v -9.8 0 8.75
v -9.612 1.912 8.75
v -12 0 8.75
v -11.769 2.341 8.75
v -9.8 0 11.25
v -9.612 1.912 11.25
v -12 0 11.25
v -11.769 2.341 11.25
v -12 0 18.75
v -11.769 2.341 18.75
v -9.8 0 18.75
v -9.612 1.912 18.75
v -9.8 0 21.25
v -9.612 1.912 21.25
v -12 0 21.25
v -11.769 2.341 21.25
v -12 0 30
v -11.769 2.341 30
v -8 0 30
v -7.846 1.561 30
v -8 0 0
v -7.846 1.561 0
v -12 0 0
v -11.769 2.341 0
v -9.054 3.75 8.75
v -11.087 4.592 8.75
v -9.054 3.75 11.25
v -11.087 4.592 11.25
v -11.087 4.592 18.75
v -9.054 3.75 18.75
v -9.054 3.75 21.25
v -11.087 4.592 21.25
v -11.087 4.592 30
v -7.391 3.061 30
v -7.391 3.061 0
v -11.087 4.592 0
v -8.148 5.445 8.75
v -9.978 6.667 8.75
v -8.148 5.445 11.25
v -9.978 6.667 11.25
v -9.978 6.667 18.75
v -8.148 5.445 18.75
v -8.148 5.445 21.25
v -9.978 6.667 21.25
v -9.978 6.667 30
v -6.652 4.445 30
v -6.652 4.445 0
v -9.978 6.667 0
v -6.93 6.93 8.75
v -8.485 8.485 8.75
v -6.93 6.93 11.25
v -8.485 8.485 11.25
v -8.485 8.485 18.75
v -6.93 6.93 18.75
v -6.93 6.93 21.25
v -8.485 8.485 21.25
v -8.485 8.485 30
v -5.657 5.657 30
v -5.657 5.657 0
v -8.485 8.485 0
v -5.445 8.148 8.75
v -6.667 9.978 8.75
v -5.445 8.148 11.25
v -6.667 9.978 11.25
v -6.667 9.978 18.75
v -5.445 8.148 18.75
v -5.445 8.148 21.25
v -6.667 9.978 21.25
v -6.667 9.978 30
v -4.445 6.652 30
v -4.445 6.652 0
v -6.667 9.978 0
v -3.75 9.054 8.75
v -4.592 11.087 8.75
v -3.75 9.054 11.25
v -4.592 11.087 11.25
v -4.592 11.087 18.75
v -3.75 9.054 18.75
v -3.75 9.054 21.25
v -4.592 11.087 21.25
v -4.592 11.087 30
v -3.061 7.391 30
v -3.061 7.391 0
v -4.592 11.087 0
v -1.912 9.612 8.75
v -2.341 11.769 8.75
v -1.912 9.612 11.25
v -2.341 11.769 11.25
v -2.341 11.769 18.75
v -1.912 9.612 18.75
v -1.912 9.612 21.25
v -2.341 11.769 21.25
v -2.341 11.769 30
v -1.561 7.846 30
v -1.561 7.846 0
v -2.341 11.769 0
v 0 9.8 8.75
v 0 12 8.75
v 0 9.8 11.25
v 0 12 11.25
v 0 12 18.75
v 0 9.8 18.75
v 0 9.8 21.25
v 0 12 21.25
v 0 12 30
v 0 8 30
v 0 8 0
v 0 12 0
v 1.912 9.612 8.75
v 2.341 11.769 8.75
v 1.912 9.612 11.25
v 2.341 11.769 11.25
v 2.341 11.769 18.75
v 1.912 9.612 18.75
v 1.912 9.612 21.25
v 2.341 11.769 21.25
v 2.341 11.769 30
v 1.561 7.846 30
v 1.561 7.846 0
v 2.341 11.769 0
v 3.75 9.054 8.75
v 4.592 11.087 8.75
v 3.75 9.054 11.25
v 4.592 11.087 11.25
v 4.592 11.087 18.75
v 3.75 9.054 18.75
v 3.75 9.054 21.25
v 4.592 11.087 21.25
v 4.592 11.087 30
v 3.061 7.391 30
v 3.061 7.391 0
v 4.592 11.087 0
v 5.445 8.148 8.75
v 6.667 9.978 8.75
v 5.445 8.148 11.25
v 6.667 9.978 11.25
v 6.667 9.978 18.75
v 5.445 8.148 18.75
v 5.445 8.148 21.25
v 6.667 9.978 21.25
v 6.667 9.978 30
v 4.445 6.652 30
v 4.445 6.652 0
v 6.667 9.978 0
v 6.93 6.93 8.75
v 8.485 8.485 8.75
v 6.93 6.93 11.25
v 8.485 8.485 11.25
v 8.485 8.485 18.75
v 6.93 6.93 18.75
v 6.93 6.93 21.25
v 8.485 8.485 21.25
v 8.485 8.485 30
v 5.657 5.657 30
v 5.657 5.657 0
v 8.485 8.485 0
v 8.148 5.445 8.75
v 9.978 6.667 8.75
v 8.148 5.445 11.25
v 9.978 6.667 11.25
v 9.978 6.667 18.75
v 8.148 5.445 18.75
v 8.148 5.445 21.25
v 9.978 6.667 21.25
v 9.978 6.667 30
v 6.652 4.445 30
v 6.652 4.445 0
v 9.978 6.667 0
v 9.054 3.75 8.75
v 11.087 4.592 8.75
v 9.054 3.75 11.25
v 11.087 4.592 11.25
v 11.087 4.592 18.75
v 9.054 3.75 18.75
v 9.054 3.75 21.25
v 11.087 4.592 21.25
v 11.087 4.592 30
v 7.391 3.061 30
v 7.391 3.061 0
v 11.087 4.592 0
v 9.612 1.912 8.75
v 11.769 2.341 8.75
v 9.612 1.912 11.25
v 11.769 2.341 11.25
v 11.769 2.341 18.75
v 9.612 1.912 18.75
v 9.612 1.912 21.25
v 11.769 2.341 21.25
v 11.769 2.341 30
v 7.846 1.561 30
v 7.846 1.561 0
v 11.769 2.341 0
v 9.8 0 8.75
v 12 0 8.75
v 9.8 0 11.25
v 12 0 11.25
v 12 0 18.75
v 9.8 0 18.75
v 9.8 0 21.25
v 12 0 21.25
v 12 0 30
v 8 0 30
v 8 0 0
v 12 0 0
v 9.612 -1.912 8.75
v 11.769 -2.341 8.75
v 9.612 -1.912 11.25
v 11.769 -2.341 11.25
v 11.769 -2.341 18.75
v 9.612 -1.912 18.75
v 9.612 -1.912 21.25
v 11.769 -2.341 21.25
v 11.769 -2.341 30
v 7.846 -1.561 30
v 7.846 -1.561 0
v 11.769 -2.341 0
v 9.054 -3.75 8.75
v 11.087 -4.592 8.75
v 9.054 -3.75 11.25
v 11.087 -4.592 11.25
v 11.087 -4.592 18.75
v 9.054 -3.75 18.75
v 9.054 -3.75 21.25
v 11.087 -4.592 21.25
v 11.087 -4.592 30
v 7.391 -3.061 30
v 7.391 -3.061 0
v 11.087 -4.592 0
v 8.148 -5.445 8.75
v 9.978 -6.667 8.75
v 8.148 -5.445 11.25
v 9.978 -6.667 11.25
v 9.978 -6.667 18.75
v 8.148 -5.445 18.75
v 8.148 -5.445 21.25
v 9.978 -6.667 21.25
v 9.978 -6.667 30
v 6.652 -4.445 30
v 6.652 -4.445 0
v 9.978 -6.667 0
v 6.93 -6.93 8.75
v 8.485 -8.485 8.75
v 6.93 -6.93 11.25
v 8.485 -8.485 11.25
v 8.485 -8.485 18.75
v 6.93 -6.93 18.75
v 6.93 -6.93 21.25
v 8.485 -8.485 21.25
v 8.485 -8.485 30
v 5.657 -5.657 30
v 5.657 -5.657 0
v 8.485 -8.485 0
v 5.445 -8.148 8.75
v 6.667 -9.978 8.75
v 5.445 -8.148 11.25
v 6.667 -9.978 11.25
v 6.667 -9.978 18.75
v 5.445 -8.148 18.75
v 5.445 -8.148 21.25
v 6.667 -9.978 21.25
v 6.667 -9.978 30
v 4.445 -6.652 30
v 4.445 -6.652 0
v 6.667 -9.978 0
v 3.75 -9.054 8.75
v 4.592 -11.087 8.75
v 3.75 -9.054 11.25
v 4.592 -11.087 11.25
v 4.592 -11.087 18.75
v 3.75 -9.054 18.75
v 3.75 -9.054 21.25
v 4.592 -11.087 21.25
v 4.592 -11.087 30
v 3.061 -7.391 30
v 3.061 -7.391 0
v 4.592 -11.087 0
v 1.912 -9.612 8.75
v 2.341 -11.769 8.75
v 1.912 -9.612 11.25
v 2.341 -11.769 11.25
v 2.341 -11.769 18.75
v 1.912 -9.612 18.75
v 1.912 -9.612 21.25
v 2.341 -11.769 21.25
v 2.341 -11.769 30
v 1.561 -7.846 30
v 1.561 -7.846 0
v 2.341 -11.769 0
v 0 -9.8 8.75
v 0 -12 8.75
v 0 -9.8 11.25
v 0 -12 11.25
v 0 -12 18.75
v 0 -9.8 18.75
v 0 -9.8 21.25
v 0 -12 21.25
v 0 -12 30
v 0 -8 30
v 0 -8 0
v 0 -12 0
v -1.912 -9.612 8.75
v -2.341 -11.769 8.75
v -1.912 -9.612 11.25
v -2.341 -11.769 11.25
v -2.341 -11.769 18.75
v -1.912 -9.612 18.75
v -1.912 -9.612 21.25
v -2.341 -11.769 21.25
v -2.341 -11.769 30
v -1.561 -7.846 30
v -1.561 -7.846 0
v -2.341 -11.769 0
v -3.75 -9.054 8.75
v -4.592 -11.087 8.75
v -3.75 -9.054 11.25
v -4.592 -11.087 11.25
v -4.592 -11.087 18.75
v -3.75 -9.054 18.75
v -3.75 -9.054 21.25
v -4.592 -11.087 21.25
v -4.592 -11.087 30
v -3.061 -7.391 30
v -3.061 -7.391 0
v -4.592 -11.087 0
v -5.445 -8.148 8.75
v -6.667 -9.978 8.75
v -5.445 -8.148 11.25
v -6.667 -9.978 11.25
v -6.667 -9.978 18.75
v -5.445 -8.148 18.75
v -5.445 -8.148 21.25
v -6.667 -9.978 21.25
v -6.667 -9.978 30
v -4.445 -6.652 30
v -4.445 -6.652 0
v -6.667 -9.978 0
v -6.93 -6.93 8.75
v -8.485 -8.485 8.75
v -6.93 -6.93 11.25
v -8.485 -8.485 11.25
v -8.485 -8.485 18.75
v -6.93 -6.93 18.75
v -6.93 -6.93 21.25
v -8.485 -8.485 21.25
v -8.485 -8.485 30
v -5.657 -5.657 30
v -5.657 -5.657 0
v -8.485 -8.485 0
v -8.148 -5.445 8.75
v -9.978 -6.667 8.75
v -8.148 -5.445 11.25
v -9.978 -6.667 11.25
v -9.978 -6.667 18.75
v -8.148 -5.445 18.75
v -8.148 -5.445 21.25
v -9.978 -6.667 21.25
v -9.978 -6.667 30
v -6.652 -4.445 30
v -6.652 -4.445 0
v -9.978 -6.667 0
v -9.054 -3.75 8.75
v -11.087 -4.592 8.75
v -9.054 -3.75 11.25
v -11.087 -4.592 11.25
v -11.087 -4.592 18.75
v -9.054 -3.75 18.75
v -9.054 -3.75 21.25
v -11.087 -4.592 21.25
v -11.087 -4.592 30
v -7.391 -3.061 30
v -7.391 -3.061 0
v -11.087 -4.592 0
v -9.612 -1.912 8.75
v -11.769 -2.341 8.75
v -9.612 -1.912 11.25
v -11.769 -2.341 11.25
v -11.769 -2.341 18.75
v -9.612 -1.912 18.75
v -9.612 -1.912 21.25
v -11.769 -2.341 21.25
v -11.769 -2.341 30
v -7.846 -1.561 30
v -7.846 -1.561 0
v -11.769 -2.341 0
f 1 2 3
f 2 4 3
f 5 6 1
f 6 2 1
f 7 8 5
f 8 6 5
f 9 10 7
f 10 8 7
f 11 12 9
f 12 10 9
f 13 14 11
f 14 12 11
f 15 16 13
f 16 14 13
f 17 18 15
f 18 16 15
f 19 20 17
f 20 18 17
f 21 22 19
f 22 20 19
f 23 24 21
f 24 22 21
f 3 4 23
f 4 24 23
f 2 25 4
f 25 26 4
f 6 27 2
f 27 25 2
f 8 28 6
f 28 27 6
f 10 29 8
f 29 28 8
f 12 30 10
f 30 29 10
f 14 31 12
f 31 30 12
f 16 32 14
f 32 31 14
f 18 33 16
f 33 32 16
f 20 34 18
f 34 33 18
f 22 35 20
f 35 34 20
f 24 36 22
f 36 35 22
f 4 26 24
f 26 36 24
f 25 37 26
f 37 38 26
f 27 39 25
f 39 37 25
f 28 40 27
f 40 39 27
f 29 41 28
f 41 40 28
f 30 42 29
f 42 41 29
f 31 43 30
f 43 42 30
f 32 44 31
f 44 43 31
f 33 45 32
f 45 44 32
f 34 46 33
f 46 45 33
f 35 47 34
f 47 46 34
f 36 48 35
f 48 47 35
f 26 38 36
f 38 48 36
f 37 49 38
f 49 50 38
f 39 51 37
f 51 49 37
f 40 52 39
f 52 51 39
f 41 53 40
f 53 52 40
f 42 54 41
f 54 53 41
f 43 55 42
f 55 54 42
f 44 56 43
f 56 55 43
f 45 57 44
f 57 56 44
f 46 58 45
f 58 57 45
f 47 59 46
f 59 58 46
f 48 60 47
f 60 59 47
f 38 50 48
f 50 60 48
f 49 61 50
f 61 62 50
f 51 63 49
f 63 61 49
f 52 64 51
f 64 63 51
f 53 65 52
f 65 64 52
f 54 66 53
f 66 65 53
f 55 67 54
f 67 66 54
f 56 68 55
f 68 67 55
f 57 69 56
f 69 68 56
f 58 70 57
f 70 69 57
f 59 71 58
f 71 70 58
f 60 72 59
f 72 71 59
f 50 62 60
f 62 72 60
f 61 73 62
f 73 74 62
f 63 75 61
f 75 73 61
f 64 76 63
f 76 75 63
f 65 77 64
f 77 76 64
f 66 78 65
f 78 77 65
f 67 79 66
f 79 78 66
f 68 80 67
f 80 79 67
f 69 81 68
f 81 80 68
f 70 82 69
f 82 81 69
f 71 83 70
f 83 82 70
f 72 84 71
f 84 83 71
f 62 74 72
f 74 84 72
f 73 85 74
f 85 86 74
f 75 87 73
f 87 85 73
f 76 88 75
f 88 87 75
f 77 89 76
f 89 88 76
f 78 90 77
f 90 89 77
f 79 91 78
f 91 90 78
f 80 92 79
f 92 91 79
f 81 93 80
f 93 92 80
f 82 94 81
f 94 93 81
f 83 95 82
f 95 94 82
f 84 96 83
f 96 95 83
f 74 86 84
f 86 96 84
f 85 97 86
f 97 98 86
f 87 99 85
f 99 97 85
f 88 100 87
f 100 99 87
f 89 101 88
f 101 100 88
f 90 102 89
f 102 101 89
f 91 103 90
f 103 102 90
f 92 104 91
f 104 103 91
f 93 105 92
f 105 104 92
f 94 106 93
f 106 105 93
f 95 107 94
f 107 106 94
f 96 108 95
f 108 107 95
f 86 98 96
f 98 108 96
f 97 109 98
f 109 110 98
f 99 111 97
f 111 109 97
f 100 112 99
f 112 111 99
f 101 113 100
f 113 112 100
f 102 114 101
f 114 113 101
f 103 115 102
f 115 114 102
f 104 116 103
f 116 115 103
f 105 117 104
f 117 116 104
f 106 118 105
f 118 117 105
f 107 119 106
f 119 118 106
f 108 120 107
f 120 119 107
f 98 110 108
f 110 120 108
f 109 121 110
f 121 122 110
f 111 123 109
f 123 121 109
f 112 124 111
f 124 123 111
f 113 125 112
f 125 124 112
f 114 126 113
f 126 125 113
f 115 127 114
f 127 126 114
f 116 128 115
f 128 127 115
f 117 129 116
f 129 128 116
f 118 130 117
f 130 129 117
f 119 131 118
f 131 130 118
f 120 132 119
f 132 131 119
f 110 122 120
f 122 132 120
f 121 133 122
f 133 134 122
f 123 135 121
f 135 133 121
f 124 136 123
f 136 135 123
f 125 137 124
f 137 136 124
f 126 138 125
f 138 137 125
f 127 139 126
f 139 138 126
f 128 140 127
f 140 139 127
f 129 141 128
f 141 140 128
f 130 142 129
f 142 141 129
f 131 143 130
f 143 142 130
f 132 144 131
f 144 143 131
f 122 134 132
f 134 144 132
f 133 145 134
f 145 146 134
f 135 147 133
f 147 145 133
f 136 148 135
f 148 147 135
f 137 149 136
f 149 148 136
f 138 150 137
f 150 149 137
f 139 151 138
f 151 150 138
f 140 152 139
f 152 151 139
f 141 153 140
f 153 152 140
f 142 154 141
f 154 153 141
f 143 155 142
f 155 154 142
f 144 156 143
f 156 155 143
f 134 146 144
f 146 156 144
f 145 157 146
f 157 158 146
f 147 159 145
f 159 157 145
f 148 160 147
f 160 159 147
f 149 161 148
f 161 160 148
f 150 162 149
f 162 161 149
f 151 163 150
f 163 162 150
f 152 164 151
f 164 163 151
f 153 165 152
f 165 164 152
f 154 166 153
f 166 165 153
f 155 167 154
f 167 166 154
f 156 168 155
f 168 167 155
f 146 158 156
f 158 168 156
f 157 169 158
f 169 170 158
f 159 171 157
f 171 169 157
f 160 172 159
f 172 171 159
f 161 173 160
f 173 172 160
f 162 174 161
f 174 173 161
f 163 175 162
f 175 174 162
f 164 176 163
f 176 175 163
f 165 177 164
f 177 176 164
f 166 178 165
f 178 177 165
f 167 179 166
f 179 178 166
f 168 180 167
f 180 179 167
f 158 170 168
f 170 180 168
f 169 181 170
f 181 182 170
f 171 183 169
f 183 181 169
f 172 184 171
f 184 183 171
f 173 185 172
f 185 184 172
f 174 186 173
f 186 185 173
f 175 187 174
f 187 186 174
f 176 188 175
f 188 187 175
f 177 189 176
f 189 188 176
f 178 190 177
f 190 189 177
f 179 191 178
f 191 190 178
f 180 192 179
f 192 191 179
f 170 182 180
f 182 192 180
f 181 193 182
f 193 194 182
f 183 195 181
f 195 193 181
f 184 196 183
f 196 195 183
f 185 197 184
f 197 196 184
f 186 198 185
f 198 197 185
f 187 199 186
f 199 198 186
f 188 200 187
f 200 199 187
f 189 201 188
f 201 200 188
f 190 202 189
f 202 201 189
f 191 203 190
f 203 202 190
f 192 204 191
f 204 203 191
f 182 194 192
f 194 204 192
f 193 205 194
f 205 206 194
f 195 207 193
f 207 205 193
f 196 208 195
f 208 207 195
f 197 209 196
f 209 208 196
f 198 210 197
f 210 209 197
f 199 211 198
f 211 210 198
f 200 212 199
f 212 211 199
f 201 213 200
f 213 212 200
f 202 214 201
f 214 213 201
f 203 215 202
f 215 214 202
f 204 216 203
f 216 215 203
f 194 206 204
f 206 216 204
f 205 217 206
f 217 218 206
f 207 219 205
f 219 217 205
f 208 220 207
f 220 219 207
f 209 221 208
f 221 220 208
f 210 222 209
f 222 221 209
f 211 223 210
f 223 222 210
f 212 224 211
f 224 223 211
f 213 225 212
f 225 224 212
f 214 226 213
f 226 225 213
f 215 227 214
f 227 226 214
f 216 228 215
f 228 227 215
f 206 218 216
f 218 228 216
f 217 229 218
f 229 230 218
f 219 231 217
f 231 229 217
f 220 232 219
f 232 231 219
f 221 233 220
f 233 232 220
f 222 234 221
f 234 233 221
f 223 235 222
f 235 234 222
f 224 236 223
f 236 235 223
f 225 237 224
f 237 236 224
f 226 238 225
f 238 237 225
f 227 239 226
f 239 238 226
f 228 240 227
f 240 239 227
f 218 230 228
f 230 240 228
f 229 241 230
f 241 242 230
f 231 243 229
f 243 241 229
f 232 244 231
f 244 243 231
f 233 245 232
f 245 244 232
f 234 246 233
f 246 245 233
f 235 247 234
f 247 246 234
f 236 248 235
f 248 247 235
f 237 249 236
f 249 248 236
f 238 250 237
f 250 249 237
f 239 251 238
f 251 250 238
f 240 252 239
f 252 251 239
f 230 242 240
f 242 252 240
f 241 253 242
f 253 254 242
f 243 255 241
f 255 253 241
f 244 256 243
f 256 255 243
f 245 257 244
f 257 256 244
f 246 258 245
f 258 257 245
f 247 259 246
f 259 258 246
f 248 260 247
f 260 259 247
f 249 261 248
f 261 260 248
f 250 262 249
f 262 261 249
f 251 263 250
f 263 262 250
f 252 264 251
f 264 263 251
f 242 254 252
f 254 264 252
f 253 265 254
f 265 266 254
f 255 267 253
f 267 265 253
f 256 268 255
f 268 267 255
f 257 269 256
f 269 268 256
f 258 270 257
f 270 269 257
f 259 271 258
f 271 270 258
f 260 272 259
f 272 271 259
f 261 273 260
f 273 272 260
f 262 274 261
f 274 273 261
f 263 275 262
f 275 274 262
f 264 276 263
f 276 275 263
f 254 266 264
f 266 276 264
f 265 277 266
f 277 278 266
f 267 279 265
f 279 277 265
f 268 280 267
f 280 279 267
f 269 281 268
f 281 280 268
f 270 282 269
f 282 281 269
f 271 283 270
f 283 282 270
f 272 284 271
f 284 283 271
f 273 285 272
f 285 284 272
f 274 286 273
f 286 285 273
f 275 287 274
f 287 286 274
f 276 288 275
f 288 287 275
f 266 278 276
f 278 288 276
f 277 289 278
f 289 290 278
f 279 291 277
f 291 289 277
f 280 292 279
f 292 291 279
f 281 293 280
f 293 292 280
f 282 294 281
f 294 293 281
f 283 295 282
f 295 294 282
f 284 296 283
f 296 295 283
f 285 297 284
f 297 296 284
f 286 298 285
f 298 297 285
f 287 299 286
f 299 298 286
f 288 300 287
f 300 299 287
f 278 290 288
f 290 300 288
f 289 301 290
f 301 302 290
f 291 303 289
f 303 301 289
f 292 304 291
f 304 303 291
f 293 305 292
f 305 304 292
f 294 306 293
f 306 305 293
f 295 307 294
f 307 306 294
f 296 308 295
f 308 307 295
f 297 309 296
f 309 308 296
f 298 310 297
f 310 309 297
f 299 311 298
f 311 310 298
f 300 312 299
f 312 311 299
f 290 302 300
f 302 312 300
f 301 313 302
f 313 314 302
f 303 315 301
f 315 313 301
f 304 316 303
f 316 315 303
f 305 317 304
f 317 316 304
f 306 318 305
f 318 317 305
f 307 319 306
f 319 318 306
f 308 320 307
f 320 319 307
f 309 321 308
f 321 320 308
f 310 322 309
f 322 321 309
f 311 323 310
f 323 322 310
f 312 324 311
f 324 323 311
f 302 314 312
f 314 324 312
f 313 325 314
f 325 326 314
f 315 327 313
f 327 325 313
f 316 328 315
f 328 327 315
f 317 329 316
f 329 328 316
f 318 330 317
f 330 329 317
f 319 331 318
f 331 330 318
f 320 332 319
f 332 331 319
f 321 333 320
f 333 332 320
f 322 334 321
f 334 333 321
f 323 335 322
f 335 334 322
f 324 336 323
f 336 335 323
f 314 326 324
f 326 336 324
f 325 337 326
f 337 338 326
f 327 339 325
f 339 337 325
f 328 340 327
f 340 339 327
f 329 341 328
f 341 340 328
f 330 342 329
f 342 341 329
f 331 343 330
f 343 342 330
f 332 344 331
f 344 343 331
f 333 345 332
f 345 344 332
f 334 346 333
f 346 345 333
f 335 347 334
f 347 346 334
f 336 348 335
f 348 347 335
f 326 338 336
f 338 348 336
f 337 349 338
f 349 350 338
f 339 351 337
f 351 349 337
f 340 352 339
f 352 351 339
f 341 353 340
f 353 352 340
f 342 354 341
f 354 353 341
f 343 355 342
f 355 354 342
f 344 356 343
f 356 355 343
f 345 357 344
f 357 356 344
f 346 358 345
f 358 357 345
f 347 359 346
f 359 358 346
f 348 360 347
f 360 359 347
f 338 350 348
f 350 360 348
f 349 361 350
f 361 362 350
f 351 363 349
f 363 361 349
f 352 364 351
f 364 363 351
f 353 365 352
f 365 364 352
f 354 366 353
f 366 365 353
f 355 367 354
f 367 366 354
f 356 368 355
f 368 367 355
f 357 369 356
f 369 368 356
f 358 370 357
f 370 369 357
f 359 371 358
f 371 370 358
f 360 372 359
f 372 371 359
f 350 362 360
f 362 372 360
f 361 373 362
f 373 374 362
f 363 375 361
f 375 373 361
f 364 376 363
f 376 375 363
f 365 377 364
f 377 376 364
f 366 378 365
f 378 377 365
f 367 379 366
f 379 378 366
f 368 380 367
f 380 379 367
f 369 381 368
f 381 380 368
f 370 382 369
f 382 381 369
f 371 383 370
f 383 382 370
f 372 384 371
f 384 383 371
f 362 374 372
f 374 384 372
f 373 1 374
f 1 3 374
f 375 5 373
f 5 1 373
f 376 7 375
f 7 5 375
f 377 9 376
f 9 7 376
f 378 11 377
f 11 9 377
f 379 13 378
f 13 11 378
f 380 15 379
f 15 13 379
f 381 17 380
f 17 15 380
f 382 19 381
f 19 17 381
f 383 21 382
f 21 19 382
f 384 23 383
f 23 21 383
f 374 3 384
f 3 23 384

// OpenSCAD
$fn = 32;

// ----------------------------------------------------------------------
// Grooved revolve: plain_grooves, bore R8
// ----------------------------------------------------------------------

// --- parameters (mm) ---
bore_r = 8;               // bore radius
outer_r = 12;             // outer radius of the body
total_h = 30;             // overall height, Z
wall = 4;                 // radial wall thickness
groove_w = 2.5;           // groove width
groove_d = 2.2;           // groove depth
grooves = 2;              // number of outer grooves

bbox_x = 2 * outer_r;  // full diameter
bore_d = 2 * bore_r;  // bore diameter
body_d = 2 * outer_r;  // body diameter
revolve_angle = 360;  // full turn around the Z axis

profile = [[8, 0], [12, 0], [12, 8.75], [9.8, 8.75], [9.8, 11.25], [12, 11.25], [12, 18.75], [9.8, 18.75], [9.8, 21.25], [12, 21.25], [12, 30], [8, 30]];  // primary outline, 12 points, counter clockwise

// --- the one profile operation ---
rotate_extrude(angle = revolve_angle) polygon(points = profile);
